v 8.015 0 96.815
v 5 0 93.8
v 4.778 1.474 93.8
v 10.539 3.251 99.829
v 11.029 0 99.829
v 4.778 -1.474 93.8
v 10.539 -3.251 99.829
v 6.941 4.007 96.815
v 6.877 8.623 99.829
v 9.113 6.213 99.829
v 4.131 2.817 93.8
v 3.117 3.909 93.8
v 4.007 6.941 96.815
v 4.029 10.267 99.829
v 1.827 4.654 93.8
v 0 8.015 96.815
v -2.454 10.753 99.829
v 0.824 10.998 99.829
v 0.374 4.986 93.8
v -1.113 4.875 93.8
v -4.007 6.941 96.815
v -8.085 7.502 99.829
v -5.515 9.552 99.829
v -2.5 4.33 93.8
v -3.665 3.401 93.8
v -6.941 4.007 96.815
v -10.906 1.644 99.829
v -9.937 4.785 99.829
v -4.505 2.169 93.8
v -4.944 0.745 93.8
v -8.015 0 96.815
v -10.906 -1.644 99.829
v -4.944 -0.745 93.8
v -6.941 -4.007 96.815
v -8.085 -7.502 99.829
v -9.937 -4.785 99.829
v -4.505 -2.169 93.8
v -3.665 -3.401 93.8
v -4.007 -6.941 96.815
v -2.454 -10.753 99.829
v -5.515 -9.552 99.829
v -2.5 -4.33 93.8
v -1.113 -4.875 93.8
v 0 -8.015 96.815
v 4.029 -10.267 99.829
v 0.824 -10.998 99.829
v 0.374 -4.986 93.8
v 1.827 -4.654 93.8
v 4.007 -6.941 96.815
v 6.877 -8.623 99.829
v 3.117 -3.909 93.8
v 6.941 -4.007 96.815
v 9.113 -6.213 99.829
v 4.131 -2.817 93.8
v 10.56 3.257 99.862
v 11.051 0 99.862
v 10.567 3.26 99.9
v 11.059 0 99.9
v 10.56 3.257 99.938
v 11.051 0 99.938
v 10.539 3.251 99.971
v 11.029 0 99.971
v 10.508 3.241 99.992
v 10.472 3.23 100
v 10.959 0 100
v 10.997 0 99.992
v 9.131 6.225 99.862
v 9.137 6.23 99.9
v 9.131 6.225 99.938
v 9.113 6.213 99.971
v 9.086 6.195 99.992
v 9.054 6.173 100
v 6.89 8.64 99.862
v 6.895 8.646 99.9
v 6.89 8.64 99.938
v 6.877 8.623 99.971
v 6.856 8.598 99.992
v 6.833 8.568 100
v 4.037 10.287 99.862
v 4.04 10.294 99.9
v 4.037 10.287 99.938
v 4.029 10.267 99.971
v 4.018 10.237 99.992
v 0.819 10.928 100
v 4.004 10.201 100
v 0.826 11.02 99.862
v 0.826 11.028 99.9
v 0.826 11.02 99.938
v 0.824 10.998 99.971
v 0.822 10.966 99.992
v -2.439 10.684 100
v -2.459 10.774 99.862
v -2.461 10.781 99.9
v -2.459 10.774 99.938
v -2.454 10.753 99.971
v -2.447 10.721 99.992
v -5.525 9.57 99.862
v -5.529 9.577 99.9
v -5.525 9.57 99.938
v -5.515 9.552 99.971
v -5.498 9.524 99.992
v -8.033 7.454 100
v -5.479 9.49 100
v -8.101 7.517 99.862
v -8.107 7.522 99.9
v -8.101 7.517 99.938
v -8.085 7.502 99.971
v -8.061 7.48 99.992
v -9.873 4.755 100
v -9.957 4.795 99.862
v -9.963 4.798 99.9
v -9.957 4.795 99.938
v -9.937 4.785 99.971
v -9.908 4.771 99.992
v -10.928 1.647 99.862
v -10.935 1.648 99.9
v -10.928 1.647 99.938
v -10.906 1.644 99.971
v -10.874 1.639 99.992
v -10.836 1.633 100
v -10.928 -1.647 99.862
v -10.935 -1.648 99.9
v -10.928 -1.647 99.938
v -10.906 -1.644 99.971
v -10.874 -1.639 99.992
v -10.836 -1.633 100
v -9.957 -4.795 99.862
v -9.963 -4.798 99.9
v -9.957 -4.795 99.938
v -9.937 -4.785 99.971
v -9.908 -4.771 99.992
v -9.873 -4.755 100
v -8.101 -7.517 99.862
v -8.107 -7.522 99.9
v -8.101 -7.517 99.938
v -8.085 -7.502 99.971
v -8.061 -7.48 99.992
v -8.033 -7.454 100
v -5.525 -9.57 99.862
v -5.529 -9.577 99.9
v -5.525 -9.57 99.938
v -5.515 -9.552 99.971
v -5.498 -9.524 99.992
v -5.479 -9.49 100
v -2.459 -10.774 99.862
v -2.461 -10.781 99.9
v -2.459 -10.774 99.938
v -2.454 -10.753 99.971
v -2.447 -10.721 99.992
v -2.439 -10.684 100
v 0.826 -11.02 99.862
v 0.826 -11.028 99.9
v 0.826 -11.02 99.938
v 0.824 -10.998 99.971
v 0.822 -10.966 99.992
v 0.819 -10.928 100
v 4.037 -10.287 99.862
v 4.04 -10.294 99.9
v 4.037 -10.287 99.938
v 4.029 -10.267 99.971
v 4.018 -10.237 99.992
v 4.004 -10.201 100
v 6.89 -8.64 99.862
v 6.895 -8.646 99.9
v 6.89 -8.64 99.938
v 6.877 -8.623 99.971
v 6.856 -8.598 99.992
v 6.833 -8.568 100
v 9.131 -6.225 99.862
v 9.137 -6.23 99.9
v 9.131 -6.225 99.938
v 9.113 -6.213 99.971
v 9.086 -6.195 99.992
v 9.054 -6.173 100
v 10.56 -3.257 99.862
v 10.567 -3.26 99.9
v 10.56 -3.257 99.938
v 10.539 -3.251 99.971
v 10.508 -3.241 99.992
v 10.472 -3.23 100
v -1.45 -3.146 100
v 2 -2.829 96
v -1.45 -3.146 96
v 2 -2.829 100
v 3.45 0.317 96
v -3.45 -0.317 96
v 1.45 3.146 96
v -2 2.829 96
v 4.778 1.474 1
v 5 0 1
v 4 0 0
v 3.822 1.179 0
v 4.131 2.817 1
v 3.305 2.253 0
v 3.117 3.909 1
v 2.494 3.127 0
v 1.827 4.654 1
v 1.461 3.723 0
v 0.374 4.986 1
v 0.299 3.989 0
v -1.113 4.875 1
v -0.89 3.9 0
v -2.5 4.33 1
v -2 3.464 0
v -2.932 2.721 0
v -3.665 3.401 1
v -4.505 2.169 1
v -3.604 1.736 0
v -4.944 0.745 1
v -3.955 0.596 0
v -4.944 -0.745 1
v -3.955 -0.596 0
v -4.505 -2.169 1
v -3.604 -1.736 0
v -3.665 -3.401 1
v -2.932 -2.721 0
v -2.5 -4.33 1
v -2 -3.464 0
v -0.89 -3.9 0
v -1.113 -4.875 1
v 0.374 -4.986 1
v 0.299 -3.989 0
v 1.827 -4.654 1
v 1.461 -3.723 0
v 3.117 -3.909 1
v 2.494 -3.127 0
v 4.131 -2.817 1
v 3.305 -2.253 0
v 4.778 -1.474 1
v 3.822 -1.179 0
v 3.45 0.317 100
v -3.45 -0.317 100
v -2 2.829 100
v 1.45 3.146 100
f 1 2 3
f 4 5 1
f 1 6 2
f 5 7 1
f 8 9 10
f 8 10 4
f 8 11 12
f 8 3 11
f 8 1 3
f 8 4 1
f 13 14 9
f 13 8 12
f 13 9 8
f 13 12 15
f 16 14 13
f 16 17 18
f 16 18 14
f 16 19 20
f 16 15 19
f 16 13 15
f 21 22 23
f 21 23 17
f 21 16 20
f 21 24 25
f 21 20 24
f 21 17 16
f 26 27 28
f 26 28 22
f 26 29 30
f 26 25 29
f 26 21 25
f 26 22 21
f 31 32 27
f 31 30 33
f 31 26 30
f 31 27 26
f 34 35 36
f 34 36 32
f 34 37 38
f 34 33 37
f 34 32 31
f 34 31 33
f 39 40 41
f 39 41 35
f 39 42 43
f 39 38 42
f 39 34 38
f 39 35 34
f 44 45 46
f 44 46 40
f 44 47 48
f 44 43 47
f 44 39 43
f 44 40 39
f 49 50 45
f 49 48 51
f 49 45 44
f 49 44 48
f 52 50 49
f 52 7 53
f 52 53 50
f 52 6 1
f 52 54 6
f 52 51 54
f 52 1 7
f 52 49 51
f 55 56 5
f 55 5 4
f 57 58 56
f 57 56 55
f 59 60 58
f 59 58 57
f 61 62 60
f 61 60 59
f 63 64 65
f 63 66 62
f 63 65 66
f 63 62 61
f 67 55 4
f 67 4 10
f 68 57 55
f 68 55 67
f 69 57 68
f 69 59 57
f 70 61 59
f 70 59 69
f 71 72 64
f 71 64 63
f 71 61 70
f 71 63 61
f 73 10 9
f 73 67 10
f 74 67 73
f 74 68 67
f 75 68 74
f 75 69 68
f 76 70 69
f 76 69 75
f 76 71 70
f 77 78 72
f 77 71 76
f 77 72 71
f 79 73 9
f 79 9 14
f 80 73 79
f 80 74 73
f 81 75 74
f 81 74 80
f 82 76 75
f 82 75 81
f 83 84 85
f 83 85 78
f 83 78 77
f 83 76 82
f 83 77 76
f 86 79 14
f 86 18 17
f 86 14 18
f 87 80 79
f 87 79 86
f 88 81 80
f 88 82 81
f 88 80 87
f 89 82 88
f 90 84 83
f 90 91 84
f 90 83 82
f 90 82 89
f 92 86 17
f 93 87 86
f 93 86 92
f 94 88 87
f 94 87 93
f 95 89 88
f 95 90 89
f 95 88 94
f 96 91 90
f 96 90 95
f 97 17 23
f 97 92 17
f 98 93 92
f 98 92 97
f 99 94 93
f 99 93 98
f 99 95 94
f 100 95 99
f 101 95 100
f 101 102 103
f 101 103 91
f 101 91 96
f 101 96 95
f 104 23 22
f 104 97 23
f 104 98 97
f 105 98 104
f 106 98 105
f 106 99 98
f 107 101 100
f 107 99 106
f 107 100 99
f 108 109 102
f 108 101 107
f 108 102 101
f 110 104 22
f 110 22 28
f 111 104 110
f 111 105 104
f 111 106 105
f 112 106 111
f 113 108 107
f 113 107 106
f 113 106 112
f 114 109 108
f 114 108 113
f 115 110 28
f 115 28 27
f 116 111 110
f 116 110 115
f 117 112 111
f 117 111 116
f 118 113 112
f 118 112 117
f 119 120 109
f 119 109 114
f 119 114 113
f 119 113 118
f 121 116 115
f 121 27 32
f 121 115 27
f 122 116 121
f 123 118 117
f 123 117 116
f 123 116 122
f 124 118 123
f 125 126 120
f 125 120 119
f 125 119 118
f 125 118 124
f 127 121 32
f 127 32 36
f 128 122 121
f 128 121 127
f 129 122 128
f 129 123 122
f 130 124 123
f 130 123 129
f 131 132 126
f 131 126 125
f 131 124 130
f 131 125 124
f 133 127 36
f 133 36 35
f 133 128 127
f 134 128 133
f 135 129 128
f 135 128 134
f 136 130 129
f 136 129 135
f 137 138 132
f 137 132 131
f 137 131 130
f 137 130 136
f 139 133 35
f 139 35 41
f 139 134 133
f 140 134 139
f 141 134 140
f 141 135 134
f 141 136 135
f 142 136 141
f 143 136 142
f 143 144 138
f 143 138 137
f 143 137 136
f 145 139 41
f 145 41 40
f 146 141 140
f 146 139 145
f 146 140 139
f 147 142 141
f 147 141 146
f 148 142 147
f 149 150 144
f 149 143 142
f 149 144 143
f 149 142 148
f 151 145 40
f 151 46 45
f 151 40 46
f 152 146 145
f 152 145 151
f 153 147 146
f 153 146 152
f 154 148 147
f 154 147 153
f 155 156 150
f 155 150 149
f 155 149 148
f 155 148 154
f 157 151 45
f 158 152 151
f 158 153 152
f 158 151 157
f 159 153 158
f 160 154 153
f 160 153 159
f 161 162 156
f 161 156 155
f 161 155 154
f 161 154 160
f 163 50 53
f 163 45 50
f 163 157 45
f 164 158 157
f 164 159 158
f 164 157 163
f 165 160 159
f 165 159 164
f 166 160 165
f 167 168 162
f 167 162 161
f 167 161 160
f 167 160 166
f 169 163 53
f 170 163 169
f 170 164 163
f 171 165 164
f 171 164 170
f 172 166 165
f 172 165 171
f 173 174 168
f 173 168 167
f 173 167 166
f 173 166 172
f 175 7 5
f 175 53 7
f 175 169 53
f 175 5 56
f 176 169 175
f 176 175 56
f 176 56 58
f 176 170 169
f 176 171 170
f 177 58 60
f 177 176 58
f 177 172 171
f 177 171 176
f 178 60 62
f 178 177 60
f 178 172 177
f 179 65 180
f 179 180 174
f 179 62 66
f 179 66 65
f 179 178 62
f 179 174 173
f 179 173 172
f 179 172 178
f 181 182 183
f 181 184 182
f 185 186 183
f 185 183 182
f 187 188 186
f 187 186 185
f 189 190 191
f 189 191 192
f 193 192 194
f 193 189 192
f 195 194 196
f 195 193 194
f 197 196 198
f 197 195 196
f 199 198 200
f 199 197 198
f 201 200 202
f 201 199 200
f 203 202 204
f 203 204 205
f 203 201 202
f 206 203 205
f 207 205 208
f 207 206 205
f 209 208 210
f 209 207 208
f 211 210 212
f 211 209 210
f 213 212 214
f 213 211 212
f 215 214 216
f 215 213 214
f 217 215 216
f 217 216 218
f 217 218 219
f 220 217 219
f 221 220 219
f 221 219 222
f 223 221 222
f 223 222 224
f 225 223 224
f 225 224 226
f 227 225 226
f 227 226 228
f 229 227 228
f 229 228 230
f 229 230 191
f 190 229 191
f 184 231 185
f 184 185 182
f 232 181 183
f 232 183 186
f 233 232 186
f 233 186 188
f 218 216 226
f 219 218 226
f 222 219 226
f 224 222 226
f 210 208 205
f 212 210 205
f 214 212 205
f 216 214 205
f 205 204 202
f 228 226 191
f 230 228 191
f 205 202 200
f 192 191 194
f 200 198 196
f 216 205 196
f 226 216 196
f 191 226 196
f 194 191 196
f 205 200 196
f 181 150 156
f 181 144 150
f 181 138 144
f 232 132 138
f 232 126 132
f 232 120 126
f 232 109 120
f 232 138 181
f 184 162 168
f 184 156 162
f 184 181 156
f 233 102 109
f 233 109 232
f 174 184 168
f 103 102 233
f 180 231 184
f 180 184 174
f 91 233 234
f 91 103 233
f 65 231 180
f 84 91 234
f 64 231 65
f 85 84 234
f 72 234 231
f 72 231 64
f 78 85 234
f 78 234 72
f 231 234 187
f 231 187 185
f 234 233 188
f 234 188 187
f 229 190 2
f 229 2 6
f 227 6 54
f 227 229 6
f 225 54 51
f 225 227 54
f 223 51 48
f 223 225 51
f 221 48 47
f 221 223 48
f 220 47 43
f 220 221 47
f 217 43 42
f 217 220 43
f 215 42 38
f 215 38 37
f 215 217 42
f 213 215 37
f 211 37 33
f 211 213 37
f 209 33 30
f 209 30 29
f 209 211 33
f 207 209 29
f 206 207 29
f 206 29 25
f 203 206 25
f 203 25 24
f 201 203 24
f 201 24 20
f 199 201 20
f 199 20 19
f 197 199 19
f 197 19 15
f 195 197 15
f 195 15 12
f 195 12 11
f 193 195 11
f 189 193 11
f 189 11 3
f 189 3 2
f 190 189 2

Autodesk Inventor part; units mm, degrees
ref_plane "YZ Plane" through (0, 0, 0) normal (1, 0, 0) x (0, 1, 0)
ref_plane "XZ Plane" through (0, 0, 0) normal (0, 1, 0) x (-1, 0, 0)
ref_plane "XY Plane" through (0, 0, 0) normal (0, 0, 1) x (1, 0, 0)
sketch "Sketch1" plane through (0, 0, 0) normal (0, 0, 1) x (1, 0, 0)
  circle A0 centre (0, 0) radius 5
  dimension "Diameter" = 10
extrude "Extrusion1" add sketch "Sketch1" along normal blind 93.8
sketch "Sketch2" plane through (0, 0, 93.8) normal (0, 0, 1) x (1, 0, 0)
  circle A0 centre (0, 0) radius 5 projected
extrude "Extrusion2" add sketch "Sketch2" along normal blind 6.2 draft 45
sketch "Sketch3" plane through (0, 0, 100) normal (0, 0, 1) x (1, 0, 0)
  circle A0 centre (0, 0) radius 11.2 projected
  circle A1 centre (0, 0) radius 3.4641 construction
  line L0 (1.4501, 3.146) -> (3.4495, 0.3172)
  line L1 (3.4495, 0.3172) -> (1.9995, -2.8288)
  line L2 (1.9995, -2.8288) -> (-1.4501, -3.146)
  line L3 (-1.4501, -3.146) -> (-3.4495, -0.3172)
  line L4 (-3.4495, -0.3172) -> (-1.9995, 2.8288)
  line L5 (-1.9995, 2.8288) -> (1.4501, 3.146)
  dimension "Hex_Width" = 6
extrude "Extrusion3" cut sketch "Sketch3" against normal blind 4 contours L0 L1 L2 L3 L4 L5
thread "Thread1" size "M10x1.5" class "4g6g" standard "ANSI Metric M Profile" length 55
chamfer "Chamfer2" distance 1 angle 45 1 edges at (-5, 0, 0)
fillet "Fillet1" radius 0.1 1 edges at (-11.2, 0, 100)
equation "\"d10\" = Thread_Length"
equation "\"d13\" = Chamfer"
equation "\"Thread_Length\" = 55"
equation "\"Chamfer\" = 1"
properties part number "SCREW,FLAT HD,P, 5,M8X1.25X100MM"
